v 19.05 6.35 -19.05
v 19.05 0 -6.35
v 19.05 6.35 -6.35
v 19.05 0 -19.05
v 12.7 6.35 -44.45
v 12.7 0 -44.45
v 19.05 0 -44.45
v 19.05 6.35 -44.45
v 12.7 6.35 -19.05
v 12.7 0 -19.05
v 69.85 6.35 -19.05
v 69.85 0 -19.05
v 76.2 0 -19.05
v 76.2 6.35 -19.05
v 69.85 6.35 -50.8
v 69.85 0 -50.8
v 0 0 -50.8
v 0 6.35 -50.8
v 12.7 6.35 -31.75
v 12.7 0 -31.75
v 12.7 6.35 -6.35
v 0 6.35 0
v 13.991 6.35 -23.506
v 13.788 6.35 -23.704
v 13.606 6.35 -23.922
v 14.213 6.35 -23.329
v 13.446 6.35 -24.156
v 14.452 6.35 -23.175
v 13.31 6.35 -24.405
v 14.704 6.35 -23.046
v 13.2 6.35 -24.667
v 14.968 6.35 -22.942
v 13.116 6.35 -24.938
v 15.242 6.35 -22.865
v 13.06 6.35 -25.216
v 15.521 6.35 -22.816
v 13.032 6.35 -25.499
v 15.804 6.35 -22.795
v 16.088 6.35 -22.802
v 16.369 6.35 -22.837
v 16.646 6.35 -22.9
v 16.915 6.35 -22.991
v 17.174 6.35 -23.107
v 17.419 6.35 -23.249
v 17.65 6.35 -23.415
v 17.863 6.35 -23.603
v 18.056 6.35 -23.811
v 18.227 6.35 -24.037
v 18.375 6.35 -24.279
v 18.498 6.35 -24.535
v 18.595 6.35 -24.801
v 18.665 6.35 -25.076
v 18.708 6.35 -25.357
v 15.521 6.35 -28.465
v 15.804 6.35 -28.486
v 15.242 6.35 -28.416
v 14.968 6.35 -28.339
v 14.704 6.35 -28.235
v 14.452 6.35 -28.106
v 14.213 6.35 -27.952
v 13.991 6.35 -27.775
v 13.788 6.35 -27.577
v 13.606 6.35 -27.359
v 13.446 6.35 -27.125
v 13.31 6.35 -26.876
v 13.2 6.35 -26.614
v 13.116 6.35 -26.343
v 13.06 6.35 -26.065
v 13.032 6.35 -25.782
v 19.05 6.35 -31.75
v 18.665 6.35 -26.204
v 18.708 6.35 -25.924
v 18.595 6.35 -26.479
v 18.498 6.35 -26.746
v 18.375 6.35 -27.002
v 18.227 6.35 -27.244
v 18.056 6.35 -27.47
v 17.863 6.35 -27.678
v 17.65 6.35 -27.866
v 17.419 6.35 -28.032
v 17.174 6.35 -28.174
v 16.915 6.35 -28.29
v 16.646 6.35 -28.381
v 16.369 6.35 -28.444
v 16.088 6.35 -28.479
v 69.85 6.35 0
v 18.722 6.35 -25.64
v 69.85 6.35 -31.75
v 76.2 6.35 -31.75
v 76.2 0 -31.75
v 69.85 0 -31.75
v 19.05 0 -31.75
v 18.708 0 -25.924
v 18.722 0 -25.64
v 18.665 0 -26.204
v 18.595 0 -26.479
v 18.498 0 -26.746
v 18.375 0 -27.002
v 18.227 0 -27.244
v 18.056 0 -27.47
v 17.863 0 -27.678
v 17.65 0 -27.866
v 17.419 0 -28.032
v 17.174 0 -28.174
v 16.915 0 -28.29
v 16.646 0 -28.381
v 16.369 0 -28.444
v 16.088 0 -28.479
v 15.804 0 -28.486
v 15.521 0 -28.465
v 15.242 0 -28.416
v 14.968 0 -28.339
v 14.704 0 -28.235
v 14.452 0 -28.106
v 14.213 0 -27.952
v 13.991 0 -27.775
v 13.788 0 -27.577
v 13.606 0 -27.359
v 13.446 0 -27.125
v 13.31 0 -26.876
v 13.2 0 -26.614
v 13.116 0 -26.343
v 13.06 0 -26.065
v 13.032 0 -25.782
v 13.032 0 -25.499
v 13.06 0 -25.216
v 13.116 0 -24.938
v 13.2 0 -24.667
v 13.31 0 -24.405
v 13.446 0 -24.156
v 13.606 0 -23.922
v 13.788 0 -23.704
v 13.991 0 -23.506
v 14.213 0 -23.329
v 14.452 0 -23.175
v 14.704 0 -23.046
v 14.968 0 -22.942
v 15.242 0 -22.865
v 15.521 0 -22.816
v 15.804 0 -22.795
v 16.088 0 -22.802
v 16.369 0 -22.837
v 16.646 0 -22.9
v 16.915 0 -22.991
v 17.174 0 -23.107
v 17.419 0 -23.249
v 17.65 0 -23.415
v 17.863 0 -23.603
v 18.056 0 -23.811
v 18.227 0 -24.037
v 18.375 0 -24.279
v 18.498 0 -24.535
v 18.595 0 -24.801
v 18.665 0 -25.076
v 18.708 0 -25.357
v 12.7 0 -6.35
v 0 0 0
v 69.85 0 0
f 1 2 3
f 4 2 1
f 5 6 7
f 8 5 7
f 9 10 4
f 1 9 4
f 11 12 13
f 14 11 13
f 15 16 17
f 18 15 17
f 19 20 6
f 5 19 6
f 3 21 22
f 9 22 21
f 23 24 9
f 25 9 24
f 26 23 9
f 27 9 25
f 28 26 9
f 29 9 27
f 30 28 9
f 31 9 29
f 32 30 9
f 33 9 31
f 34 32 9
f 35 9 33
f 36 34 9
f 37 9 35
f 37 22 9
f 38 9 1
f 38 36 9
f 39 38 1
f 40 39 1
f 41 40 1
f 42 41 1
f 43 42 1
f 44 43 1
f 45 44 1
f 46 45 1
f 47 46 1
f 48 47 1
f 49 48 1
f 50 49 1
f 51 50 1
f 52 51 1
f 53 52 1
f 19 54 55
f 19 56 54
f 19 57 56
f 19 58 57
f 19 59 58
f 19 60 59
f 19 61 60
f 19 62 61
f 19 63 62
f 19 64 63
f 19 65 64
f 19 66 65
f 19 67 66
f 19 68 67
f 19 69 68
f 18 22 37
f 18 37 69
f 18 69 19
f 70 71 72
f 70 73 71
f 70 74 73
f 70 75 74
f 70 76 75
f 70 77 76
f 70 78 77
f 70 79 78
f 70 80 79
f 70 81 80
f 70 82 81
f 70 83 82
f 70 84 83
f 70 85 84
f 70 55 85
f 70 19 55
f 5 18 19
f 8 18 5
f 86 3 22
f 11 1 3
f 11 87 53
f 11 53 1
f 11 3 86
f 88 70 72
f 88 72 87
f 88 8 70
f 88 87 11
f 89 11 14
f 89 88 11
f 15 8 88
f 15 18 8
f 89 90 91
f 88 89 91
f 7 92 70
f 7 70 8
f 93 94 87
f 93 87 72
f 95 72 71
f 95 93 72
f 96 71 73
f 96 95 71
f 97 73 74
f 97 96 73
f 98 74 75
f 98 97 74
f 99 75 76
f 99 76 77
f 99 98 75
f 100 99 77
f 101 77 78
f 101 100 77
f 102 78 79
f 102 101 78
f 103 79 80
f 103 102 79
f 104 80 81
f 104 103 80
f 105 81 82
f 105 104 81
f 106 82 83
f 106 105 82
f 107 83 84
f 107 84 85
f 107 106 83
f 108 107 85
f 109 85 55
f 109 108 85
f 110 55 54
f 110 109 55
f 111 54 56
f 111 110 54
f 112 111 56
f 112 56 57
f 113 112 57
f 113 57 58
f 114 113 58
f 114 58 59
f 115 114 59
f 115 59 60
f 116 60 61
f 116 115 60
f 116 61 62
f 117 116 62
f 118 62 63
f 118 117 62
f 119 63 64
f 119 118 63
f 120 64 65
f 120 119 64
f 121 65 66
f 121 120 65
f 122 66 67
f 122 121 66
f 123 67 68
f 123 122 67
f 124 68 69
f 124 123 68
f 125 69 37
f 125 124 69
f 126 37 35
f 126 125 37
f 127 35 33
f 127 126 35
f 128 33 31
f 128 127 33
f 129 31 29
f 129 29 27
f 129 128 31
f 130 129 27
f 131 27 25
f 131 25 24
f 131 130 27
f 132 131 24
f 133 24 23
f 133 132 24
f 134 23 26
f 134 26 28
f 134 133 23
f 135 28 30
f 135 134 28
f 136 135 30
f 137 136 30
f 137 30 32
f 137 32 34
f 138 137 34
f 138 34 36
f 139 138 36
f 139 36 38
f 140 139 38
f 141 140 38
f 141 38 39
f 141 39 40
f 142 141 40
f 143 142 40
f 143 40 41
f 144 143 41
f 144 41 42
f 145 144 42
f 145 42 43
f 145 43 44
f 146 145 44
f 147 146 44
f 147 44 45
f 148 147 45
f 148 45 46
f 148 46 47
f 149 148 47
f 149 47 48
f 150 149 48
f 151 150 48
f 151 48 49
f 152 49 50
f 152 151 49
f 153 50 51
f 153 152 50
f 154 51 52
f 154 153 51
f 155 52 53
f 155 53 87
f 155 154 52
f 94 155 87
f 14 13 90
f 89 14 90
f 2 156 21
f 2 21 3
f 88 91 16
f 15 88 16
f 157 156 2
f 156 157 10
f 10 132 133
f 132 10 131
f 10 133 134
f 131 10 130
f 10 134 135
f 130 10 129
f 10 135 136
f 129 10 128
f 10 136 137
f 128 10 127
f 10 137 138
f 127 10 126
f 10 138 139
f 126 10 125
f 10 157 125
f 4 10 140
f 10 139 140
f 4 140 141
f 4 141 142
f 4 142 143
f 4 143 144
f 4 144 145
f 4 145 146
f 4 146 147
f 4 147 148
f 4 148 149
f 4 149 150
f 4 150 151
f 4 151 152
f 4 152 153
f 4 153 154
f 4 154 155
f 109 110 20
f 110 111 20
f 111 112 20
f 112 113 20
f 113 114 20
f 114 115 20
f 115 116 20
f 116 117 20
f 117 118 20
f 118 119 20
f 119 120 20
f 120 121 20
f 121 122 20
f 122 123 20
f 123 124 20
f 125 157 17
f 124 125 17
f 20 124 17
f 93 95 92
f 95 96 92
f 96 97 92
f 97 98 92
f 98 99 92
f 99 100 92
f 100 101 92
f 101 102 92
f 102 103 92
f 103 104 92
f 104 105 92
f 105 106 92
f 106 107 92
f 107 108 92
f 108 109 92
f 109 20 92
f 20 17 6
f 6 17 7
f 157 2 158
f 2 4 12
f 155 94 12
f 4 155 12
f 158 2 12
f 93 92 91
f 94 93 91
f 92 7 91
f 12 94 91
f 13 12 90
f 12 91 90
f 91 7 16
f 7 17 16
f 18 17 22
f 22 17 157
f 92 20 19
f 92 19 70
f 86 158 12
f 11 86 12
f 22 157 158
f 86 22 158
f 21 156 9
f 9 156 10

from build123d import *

# Parameters (mm, degrees)
SKETCH1_R           = 2.846646533
SKETCH1_W           = 6.35
SKETCH1_H           = 12.7
BOSS_EXTRUDE1_DEPTH = 6.35


with BuildPart() as part:
    # Sketch1 → Boss-Extrude1 (new body)
    with BuildSketch(Plane(origin=(0, 0, 0), x_dir=(1, 0, 0), z_dir=(0, 1, 0))):
        Polygon((0, 0), (69.85, 0), (69.85, 19.05), (76.2, 19.05), (76.2, 31.75), (69.85, 31.75), (69.85, 50.8), (0, 50.8), align=None)
        with Locations((15.875, 25.640429005)):
            Circle(SKETCH1_R, mode=Mode.SUBTRACT)
        with Locations((15.875, 38.1)):
            Rectangle(SKETCH1_W, SKETCH1_H, mode=Mode.SUBTRACT)
        with Locations((15.875, 12.7)):
            Rectangle(SKETCH1_W, SKETCH1_H, mode=Mode.SUBTRACT)
    extrude(amount=BOSS_EXTRUDE1_DEPTH)


solid = part.part
